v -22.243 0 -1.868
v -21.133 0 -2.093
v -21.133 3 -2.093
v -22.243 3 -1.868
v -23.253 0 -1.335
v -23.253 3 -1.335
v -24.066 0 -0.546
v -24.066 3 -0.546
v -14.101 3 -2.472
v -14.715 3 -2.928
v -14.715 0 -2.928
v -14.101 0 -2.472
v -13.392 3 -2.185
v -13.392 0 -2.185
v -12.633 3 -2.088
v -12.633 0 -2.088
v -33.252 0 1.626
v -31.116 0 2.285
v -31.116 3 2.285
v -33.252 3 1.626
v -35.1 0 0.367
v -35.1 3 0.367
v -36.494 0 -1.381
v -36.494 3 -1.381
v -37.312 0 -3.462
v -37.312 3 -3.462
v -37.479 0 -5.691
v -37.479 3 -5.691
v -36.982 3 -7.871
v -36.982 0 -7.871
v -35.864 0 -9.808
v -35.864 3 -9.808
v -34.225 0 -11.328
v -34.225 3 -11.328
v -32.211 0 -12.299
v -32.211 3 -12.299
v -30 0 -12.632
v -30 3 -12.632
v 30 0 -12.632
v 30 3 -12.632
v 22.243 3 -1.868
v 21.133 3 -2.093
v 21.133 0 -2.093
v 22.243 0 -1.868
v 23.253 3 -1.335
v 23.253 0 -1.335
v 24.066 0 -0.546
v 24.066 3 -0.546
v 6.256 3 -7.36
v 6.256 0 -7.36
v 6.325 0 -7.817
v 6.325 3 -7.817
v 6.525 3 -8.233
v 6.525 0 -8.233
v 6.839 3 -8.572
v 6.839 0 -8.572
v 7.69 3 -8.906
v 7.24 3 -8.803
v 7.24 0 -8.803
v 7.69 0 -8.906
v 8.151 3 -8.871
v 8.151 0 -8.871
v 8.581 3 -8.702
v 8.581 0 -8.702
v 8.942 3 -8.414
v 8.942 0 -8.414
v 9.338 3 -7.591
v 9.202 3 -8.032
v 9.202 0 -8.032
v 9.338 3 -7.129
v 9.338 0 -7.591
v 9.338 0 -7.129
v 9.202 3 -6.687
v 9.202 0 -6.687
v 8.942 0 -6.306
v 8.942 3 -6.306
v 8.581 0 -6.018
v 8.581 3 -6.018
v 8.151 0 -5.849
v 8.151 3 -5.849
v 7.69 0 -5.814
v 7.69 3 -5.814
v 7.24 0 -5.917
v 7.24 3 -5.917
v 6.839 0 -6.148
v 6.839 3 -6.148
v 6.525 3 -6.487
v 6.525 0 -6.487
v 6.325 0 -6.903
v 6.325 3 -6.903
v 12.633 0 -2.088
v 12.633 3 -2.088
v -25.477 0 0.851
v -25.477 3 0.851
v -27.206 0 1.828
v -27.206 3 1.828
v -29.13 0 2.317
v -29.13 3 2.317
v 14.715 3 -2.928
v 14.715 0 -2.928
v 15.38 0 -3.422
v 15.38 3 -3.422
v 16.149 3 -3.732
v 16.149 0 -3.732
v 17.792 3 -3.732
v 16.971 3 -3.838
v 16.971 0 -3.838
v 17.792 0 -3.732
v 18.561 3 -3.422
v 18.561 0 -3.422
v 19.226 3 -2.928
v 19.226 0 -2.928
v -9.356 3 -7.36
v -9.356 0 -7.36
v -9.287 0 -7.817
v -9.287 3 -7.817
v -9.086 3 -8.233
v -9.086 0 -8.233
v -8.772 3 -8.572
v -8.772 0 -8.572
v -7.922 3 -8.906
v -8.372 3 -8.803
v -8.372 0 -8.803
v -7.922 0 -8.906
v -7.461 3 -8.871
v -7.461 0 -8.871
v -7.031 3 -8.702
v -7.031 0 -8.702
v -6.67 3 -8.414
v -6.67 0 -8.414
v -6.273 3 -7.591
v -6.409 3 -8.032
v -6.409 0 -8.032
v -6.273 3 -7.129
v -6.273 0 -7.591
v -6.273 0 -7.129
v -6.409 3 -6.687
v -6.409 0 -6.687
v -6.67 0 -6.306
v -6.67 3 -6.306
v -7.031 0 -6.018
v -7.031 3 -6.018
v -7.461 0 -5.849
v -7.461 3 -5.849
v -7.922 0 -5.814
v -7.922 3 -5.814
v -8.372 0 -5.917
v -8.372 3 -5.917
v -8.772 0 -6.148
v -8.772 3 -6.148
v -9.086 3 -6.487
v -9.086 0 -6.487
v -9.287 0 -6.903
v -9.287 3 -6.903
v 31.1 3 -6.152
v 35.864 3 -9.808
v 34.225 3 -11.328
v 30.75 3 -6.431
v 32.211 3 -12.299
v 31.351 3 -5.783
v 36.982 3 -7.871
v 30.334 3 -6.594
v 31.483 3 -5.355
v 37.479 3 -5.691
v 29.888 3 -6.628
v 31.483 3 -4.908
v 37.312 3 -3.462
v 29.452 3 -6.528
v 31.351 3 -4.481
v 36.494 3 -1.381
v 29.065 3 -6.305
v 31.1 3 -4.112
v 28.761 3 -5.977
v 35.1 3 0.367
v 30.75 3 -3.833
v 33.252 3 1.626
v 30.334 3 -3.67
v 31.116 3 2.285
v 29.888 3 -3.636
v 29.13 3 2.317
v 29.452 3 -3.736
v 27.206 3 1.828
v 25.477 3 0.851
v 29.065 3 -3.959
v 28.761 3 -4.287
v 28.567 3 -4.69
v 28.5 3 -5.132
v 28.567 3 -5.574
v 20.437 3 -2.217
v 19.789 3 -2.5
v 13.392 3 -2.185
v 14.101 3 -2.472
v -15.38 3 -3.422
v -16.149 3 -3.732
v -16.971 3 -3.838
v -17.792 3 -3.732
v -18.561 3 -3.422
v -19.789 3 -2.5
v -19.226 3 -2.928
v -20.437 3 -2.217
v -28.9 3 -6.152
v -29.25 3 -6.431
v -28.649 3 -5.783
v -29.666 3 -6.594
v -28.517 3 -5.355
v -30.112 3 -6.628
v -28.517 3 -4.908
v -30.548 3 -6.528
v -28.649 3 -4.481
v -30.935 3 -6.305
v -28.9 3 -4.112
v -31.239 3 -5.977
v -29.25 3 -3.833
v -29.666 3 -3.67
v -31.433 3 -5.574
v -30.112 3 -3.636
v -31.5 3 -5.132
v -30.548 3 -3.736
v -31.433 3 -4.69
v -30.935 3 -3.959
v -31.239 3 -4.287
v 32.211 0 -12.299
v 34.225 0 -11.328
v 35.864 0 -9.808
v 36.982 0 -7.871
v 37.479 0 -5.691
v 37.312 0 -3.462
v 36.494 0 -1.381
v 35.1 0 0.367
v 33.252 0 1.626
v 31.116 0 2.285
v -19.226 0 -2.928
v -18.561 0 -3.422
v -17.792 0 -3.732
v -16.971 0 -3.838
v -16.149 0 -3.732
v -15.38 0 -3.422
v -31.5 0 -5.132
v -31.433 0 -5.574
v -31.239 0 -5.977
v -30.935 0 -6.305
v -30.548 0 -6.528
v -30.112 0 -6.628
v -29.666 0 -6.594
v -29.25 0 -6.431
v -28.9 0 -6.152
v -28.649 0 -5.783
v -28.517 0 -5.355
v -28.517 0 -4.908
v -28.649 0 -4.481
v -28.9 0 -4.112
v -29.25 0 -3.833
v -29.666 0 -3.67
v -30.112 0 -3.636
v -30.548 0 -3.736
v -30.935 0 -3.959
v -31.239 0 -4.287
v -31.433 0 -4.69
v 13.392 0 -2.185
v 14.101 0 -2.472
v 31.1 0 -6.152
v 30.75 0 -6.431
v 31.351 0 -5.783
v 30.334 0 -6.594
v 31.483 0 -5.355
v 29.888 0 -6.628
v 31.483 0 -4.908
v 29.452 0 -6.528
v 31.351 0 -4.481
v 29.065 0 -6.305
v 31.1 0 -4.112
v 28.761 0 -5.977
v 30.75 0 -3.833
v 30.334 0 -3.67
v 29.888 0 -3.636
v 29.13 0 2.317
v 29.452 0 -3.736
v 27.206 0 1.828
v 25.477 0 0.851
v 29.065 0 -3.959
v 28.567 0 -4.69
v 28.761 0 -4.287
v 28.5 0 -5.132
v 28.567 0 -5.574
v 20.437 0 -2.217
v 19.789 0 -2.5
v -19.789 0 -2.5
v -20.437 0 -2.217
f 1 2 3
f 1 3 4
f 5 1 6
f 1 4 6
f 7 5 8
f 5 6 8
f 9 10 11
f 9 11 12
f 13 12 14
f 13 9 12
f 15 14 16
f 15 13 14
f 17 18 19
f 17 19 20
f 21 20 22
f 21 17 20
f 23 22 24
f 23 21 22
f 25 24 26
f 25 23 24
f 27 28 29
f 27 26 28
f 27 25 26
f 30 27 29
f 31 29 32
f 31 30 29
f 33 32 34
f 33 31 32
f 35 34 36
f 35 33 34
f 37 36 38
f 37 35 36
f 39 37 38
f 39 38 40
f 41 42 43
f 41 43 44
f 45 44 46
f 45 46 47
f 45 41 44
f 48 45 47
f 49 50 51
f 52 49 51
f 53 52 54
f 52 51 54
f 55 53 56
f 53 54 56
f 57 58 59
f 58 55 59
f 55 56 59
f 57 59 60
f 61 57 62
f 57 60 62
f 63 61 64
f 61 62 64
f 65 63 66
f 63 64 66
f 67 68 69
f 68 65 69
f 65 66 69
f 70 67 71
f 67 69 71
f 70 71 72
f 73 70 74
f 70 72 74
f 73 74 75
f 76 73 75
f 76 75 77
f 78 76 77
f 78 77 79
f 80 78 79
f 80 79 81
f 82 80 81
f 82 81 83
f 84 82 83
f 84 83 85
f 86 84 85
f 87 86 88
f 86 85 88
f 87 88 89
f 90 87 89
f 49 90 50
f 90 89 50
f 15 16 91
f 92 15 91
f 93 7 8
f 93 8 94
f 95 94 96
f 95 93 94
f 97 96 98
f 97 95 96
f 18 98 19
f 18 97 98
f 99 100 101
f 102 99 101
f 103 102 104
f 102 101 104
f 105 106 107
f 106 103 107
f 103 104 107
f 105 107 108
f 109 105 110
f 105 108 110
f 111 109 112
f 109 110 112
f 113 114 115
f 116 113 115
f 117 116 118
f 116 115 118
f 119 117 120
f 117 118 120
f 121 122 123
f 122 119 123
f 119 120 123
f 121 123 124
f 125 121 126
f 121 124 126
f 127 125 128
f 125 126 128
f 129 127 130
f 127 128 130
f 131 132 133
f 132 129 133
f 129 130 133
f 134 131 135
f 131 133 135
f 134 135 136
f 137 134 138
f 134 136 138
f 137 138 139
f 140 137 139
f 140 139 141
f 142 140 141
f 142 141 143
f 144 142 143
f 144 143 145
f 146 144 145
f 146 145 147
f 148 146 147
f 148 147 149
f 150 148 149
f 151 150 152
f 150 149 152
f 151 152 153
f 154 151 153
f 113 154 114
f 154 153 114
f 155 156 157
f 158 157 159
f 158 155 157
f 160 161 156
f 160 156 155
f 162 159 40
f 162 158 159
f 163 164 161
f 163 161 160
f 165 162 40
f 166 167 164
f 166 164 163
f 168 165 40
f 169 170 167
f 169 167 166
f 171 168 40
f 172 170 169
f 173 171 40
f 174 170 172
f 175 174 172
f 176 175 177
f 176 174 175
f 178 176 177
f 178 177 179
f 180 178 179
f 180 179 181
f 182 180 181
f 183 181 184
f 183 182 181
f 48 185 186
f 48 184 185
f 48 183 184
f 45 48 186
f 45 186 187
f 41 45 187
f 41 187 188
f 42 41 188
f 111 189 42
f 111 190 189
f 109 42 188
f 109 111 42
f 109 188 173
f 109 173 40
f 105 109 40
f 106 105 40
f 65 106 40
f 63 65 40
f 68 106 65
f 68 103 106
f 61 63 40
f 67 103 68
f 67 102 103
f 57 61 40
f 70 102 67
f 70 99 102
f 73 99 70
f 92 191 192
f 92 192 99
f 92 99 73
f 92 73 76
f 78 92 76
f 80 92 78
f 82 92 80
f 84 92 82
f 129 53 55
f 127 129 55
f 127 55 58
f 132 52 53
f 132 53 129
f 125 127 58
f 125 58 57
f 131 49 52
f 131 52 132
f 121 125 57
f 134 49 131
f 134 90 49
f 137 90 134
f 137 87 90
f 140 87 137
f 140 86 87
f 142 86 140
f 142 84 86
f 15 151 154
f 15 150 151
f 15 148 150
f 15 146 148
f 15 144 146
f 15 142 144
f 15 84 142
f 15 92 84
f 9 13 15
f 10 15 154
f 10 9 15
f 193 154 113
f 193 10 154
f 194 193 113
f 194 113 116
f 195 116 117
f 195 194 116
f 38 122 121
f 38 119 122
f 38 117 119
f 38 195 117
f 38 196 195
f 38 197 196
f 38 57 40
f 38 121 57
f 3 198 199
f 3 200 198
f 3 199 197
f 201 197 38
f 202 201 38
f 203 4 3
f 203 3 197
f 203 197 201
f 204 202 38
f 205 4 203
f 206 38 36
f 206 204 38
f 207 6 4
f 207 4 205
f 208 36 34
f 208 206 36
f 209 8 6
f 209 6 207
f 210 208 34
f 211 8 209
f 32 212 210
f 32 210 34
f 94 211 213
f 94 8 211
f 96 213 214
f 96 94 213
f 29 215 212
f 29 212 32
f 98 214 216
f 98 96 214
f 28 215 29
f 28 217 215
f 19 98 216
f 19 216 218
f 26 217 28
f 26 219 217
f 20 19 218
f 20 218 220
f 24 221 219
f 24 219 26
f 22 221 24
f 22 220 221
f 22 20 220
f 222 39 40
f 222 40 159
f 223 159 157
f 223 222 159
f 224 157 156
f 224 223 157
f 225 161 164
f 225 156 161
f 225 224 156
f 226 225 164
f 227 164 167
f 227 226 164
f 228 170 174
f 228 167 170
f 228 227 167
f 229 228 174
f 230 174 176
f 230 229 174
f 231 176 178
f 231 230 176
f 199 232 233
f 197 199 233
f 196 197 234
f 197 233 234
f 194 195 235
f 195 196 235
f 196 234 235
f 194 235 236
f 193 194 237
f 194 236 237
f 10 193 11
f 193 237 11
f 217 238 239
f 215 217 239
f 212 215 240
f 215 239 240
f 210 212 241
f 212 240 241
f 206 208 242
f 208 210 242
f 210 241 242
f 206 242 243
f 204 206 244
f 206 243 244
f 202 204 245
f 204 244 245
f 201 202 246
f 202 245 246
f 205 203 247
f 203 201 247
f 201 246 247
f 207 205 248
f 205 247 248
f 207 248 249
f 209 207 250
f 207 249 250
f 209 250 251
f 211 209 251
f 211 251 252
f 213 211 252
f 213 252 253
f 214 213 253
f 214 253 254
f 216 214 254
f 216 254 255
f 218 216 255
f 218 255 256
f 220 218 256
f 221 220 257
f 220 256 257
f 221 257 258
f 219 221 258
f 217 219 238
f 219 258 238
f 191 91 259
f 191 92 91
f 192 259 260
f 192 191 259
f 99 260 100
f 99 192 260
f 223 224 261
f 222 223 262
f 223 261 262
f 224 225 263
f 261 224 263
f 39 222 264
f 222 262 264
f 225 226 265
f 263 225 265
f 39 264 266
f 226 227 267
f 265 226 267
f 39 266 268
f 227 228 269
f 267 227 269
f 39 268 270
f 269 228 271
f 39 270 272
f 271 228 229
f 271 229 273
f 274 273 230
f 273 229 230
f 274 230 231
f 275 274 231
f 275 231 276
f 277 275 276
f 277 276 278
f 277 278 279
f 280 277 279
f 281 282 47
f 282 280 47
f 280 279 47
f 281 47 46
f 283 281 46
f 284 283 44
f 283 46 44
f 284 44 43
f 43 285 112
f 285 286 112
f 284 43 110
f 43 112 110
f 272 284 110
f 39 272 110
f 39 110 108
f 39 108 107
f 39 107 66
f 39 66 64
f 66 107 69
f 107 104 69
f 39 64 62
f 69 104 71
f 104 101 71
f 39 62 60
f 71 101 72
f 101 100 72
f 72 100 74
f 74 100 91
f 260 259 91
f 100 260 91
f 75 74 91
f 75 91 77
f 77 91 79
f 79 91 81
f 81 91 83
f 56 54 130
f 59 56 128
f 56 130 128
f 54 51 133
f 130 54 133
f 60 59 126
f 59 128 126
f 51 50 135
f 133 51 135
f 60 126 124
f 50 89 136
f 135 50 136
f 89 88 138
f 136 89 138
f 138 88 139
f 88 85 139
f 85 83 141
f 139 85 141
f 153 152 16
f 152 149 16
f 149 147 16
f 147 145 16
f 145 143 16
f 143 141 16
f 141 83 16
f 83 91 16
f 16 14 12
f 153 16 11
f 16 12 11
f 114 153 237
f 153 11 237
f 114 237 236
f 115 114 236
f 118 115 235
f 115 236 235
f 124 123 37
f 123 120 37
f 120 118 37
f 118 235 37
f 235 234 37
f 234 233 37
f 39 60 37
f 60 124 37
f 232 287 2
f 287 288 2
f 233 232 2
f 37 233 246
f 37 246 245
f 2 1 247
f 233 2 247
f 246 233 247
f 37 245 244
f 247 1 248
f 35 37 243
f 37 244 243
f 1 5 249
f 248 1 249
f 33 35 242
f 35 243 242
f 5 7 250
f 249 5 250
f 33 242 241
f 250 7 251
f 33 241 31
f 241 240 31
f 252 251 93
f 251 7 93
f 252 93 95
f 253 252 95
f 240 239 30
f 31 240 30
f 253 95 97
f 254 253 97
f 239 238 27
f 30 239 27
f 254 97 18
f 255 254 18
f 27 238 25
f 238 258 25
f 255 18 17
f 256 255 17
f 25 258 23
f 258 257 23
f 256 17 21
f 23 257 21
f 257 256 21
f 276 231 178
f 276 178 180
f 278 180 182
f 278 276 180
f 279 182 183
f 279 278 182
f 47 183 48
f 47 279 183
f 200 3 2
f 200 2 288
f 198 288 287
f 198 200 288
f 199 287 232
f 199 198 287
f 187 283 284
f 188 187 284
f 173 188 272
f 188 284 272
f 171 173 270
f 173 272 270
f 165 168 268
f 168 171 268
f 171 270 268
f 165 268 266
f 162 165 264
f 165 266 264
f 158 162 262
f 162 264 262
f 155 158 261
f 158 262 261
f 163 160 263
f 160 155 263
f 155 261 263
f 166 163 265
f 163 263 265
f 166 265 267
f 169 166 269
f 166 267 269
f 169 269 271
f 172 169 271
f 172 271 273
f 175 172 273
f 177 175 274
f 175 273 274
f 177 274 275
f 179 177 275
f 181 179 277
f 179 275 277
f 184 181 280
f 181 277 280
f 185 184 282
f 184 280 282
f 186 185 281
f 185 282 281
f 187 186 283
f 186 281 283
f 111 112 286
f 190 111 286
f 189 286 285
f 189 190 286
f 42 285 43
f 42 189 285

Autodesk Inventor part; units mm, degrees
ref_plane "YZ Plane" through (0, 0, 0) normal (1, 0, 0) x (0, 1, 0)
ref_plane "XZ Plane" through (0, 0, 0) normal (0, 1, 0) x (-1, 0, 0)
ref_plane "XY Plane" through (0, 0, 0) normal (0, 0, 1) x (1, 0, 0)
sketch "Sketch1" plane through (0, 0, 0) normal (0, 1, 0) x (-1, 0, 0)
  circle A0 centre (-16.9706, -0.5878) radius 1.5
  circle A1 centre (16.9706, -0.5878) radius 1.5
  circle A2 centre (30, -5.1319) radius 1.5
  circle A3 centre (-30, -5.1319) radius 1.5
  circle A4 centre (16.9706, -0.5878) radius 5 construction
  circle A5 centre (-16.9706, -0.5878) radius 5 construction
  arc A6 (-31.1155, 2.2846) -> (-30, -12.6319) centre (-30, -5.1319) ccw
  arc A7 (30, -12.6319) -> (31.1155, 2.2846) centre (30, -5.1319) ccw
  line L0 (30, -12.6319) -> (-30, -12.6319)
  line L1 (-16.9706, 4.4122) -> (16.9706, 4.4122)
  line L2 (-16.9706, 4.4122) -> (-31.1155, 2.2846)
  line L3 (16.9706, 4.4122) -> (31.1155, 2.2846)
  arc A8 (31.1155, 2.2846) -> (23.1456, -2.0878) centre (30, -5.1319) ccw
  arc A9 (-30, -12.6319) -> (-23.1456, -2.0878) centre (-30, -5.1319) ccw construction
  line L4 (0, 4.2106) -> (0, -4.2106) construction
  line L5 (0, -4.2106) -> (3.1574, -4.2106) construction
  line L6 (0, -4.2106) -> (0, -12.6319) construction
  circle A10 centre (0, 0) radius 1.55
  line L7 (0, -8.4213) -> (15.6117, -8.4213) construction
  line L8 (0, -8.4213) -> (-15.6117, -8.4213) construction
  circle A11 centre (7.8058, -8.4213) radius 1.55 construction
  circle A12 centre (-7.8058, -8.4213) radius 1.55 construction
  line L9 (16.9706, -2.0878) -> (-16.9706, -2.0878)
  line L10 (16.9706, -2.0878) -> (23.1456, -2.0878)
  line L11 (-16.9706, -2.0878) -> (-23.1456, -2.0878)
  arc A13 (-23.1456, -2.0878) -> (-31.1155, 2.2846) centre (-30, -5.1319) ccw
  arc A14 (23.1456, -2.0878) -> (30, -12.6319) centre (30, -5.1319) ccw construction
  line L12 (7.8058, -12.6319) -> (7.8058, -2.0878) construction
  line L13 (-7.8058, -12.6319) -> (-7.8058, -2.0878) construction
  line L14 (3.5375, -12.6319) -> (3.5375, -2.0878) construction
  line L15 (3.5375, -7.3599) -> (10.9646, -7.3599) construction
  line L16 (3.5375, -7.3599) -> (-12.9158, -7.3599) construction
  circle A15 centre (7.8058, -7.3599) radius 1.55
  circle A16 centre (-7.8058, -7.3599) radius 1.55
  circle A17 centre (-16.9706, -0.5878) radius 3.25
  circle A18 centre (16.9706, -0.5878) radius 3.25
  circle A19 centre (16.9706, -0.5878) radius 2.75 construction
  line L17 (15.3828, -3.3378) -> (13.7951, -0.5878) construction
  line L18 (13.7951, -0.5878) -> (15.3828, 2.1622) construction
  line L19 (15.3828, 2.1622) -> (18.5583, 2.1622) construction
  line L20 (18.5583, 2.1622) -> (20.146, -0.5878) construction
  line L21 (20.146, -0.5878) -> (18.5583, -3.3378) construction
  line L22 (18.5583, -3.3378) -> (15.3828, -3.3378) construction
  point P0 (0, 0)
  point P1 (19.8537, -2.0878)
  point P2 (14.0874, -2.0878)
  point P3 (-14.0874, -2.0878)
  point P4 (-19.8537, -2.0878)
  point P5 (16.9706, -3.3378)
  dimension "d0" = 10
  dimension "d1" = 10
  dimension "d20" = 5.5
  dimension "d2" = 15
  dimension "d3" = 15
  dimension "d4" = 3.1
  dimension "d5" = 3.1
  dimension "d6" = 3.1
  dimension "d13" = 10.5442
  dimension "d14" = 3.1
  dimension "d15" = 3.1
  dimension "d16" = 6.5
  dimension "d17" = 6.5
extrude "Extrusion1" add sketch "Sketch1" along normal blind 3 contours L9 A18 L10 A8 A7 L0 A6 A13 L11 A17
fillet "Fillet2" radius 3 4 edges at (-19.8537, 1.5, -2.0878) (-14.0874, 1.5, -2.0878) (14.0874, 1.5, -2.0878) (19.8537, 1.5, -2.0878)
fillet "Fillet3" radius 4 2 edges at (-23.1456, 1.5, -2.0878) (23.1456, 1.5, -2.0878)
properties part number "prig to kauri conversion plate"
